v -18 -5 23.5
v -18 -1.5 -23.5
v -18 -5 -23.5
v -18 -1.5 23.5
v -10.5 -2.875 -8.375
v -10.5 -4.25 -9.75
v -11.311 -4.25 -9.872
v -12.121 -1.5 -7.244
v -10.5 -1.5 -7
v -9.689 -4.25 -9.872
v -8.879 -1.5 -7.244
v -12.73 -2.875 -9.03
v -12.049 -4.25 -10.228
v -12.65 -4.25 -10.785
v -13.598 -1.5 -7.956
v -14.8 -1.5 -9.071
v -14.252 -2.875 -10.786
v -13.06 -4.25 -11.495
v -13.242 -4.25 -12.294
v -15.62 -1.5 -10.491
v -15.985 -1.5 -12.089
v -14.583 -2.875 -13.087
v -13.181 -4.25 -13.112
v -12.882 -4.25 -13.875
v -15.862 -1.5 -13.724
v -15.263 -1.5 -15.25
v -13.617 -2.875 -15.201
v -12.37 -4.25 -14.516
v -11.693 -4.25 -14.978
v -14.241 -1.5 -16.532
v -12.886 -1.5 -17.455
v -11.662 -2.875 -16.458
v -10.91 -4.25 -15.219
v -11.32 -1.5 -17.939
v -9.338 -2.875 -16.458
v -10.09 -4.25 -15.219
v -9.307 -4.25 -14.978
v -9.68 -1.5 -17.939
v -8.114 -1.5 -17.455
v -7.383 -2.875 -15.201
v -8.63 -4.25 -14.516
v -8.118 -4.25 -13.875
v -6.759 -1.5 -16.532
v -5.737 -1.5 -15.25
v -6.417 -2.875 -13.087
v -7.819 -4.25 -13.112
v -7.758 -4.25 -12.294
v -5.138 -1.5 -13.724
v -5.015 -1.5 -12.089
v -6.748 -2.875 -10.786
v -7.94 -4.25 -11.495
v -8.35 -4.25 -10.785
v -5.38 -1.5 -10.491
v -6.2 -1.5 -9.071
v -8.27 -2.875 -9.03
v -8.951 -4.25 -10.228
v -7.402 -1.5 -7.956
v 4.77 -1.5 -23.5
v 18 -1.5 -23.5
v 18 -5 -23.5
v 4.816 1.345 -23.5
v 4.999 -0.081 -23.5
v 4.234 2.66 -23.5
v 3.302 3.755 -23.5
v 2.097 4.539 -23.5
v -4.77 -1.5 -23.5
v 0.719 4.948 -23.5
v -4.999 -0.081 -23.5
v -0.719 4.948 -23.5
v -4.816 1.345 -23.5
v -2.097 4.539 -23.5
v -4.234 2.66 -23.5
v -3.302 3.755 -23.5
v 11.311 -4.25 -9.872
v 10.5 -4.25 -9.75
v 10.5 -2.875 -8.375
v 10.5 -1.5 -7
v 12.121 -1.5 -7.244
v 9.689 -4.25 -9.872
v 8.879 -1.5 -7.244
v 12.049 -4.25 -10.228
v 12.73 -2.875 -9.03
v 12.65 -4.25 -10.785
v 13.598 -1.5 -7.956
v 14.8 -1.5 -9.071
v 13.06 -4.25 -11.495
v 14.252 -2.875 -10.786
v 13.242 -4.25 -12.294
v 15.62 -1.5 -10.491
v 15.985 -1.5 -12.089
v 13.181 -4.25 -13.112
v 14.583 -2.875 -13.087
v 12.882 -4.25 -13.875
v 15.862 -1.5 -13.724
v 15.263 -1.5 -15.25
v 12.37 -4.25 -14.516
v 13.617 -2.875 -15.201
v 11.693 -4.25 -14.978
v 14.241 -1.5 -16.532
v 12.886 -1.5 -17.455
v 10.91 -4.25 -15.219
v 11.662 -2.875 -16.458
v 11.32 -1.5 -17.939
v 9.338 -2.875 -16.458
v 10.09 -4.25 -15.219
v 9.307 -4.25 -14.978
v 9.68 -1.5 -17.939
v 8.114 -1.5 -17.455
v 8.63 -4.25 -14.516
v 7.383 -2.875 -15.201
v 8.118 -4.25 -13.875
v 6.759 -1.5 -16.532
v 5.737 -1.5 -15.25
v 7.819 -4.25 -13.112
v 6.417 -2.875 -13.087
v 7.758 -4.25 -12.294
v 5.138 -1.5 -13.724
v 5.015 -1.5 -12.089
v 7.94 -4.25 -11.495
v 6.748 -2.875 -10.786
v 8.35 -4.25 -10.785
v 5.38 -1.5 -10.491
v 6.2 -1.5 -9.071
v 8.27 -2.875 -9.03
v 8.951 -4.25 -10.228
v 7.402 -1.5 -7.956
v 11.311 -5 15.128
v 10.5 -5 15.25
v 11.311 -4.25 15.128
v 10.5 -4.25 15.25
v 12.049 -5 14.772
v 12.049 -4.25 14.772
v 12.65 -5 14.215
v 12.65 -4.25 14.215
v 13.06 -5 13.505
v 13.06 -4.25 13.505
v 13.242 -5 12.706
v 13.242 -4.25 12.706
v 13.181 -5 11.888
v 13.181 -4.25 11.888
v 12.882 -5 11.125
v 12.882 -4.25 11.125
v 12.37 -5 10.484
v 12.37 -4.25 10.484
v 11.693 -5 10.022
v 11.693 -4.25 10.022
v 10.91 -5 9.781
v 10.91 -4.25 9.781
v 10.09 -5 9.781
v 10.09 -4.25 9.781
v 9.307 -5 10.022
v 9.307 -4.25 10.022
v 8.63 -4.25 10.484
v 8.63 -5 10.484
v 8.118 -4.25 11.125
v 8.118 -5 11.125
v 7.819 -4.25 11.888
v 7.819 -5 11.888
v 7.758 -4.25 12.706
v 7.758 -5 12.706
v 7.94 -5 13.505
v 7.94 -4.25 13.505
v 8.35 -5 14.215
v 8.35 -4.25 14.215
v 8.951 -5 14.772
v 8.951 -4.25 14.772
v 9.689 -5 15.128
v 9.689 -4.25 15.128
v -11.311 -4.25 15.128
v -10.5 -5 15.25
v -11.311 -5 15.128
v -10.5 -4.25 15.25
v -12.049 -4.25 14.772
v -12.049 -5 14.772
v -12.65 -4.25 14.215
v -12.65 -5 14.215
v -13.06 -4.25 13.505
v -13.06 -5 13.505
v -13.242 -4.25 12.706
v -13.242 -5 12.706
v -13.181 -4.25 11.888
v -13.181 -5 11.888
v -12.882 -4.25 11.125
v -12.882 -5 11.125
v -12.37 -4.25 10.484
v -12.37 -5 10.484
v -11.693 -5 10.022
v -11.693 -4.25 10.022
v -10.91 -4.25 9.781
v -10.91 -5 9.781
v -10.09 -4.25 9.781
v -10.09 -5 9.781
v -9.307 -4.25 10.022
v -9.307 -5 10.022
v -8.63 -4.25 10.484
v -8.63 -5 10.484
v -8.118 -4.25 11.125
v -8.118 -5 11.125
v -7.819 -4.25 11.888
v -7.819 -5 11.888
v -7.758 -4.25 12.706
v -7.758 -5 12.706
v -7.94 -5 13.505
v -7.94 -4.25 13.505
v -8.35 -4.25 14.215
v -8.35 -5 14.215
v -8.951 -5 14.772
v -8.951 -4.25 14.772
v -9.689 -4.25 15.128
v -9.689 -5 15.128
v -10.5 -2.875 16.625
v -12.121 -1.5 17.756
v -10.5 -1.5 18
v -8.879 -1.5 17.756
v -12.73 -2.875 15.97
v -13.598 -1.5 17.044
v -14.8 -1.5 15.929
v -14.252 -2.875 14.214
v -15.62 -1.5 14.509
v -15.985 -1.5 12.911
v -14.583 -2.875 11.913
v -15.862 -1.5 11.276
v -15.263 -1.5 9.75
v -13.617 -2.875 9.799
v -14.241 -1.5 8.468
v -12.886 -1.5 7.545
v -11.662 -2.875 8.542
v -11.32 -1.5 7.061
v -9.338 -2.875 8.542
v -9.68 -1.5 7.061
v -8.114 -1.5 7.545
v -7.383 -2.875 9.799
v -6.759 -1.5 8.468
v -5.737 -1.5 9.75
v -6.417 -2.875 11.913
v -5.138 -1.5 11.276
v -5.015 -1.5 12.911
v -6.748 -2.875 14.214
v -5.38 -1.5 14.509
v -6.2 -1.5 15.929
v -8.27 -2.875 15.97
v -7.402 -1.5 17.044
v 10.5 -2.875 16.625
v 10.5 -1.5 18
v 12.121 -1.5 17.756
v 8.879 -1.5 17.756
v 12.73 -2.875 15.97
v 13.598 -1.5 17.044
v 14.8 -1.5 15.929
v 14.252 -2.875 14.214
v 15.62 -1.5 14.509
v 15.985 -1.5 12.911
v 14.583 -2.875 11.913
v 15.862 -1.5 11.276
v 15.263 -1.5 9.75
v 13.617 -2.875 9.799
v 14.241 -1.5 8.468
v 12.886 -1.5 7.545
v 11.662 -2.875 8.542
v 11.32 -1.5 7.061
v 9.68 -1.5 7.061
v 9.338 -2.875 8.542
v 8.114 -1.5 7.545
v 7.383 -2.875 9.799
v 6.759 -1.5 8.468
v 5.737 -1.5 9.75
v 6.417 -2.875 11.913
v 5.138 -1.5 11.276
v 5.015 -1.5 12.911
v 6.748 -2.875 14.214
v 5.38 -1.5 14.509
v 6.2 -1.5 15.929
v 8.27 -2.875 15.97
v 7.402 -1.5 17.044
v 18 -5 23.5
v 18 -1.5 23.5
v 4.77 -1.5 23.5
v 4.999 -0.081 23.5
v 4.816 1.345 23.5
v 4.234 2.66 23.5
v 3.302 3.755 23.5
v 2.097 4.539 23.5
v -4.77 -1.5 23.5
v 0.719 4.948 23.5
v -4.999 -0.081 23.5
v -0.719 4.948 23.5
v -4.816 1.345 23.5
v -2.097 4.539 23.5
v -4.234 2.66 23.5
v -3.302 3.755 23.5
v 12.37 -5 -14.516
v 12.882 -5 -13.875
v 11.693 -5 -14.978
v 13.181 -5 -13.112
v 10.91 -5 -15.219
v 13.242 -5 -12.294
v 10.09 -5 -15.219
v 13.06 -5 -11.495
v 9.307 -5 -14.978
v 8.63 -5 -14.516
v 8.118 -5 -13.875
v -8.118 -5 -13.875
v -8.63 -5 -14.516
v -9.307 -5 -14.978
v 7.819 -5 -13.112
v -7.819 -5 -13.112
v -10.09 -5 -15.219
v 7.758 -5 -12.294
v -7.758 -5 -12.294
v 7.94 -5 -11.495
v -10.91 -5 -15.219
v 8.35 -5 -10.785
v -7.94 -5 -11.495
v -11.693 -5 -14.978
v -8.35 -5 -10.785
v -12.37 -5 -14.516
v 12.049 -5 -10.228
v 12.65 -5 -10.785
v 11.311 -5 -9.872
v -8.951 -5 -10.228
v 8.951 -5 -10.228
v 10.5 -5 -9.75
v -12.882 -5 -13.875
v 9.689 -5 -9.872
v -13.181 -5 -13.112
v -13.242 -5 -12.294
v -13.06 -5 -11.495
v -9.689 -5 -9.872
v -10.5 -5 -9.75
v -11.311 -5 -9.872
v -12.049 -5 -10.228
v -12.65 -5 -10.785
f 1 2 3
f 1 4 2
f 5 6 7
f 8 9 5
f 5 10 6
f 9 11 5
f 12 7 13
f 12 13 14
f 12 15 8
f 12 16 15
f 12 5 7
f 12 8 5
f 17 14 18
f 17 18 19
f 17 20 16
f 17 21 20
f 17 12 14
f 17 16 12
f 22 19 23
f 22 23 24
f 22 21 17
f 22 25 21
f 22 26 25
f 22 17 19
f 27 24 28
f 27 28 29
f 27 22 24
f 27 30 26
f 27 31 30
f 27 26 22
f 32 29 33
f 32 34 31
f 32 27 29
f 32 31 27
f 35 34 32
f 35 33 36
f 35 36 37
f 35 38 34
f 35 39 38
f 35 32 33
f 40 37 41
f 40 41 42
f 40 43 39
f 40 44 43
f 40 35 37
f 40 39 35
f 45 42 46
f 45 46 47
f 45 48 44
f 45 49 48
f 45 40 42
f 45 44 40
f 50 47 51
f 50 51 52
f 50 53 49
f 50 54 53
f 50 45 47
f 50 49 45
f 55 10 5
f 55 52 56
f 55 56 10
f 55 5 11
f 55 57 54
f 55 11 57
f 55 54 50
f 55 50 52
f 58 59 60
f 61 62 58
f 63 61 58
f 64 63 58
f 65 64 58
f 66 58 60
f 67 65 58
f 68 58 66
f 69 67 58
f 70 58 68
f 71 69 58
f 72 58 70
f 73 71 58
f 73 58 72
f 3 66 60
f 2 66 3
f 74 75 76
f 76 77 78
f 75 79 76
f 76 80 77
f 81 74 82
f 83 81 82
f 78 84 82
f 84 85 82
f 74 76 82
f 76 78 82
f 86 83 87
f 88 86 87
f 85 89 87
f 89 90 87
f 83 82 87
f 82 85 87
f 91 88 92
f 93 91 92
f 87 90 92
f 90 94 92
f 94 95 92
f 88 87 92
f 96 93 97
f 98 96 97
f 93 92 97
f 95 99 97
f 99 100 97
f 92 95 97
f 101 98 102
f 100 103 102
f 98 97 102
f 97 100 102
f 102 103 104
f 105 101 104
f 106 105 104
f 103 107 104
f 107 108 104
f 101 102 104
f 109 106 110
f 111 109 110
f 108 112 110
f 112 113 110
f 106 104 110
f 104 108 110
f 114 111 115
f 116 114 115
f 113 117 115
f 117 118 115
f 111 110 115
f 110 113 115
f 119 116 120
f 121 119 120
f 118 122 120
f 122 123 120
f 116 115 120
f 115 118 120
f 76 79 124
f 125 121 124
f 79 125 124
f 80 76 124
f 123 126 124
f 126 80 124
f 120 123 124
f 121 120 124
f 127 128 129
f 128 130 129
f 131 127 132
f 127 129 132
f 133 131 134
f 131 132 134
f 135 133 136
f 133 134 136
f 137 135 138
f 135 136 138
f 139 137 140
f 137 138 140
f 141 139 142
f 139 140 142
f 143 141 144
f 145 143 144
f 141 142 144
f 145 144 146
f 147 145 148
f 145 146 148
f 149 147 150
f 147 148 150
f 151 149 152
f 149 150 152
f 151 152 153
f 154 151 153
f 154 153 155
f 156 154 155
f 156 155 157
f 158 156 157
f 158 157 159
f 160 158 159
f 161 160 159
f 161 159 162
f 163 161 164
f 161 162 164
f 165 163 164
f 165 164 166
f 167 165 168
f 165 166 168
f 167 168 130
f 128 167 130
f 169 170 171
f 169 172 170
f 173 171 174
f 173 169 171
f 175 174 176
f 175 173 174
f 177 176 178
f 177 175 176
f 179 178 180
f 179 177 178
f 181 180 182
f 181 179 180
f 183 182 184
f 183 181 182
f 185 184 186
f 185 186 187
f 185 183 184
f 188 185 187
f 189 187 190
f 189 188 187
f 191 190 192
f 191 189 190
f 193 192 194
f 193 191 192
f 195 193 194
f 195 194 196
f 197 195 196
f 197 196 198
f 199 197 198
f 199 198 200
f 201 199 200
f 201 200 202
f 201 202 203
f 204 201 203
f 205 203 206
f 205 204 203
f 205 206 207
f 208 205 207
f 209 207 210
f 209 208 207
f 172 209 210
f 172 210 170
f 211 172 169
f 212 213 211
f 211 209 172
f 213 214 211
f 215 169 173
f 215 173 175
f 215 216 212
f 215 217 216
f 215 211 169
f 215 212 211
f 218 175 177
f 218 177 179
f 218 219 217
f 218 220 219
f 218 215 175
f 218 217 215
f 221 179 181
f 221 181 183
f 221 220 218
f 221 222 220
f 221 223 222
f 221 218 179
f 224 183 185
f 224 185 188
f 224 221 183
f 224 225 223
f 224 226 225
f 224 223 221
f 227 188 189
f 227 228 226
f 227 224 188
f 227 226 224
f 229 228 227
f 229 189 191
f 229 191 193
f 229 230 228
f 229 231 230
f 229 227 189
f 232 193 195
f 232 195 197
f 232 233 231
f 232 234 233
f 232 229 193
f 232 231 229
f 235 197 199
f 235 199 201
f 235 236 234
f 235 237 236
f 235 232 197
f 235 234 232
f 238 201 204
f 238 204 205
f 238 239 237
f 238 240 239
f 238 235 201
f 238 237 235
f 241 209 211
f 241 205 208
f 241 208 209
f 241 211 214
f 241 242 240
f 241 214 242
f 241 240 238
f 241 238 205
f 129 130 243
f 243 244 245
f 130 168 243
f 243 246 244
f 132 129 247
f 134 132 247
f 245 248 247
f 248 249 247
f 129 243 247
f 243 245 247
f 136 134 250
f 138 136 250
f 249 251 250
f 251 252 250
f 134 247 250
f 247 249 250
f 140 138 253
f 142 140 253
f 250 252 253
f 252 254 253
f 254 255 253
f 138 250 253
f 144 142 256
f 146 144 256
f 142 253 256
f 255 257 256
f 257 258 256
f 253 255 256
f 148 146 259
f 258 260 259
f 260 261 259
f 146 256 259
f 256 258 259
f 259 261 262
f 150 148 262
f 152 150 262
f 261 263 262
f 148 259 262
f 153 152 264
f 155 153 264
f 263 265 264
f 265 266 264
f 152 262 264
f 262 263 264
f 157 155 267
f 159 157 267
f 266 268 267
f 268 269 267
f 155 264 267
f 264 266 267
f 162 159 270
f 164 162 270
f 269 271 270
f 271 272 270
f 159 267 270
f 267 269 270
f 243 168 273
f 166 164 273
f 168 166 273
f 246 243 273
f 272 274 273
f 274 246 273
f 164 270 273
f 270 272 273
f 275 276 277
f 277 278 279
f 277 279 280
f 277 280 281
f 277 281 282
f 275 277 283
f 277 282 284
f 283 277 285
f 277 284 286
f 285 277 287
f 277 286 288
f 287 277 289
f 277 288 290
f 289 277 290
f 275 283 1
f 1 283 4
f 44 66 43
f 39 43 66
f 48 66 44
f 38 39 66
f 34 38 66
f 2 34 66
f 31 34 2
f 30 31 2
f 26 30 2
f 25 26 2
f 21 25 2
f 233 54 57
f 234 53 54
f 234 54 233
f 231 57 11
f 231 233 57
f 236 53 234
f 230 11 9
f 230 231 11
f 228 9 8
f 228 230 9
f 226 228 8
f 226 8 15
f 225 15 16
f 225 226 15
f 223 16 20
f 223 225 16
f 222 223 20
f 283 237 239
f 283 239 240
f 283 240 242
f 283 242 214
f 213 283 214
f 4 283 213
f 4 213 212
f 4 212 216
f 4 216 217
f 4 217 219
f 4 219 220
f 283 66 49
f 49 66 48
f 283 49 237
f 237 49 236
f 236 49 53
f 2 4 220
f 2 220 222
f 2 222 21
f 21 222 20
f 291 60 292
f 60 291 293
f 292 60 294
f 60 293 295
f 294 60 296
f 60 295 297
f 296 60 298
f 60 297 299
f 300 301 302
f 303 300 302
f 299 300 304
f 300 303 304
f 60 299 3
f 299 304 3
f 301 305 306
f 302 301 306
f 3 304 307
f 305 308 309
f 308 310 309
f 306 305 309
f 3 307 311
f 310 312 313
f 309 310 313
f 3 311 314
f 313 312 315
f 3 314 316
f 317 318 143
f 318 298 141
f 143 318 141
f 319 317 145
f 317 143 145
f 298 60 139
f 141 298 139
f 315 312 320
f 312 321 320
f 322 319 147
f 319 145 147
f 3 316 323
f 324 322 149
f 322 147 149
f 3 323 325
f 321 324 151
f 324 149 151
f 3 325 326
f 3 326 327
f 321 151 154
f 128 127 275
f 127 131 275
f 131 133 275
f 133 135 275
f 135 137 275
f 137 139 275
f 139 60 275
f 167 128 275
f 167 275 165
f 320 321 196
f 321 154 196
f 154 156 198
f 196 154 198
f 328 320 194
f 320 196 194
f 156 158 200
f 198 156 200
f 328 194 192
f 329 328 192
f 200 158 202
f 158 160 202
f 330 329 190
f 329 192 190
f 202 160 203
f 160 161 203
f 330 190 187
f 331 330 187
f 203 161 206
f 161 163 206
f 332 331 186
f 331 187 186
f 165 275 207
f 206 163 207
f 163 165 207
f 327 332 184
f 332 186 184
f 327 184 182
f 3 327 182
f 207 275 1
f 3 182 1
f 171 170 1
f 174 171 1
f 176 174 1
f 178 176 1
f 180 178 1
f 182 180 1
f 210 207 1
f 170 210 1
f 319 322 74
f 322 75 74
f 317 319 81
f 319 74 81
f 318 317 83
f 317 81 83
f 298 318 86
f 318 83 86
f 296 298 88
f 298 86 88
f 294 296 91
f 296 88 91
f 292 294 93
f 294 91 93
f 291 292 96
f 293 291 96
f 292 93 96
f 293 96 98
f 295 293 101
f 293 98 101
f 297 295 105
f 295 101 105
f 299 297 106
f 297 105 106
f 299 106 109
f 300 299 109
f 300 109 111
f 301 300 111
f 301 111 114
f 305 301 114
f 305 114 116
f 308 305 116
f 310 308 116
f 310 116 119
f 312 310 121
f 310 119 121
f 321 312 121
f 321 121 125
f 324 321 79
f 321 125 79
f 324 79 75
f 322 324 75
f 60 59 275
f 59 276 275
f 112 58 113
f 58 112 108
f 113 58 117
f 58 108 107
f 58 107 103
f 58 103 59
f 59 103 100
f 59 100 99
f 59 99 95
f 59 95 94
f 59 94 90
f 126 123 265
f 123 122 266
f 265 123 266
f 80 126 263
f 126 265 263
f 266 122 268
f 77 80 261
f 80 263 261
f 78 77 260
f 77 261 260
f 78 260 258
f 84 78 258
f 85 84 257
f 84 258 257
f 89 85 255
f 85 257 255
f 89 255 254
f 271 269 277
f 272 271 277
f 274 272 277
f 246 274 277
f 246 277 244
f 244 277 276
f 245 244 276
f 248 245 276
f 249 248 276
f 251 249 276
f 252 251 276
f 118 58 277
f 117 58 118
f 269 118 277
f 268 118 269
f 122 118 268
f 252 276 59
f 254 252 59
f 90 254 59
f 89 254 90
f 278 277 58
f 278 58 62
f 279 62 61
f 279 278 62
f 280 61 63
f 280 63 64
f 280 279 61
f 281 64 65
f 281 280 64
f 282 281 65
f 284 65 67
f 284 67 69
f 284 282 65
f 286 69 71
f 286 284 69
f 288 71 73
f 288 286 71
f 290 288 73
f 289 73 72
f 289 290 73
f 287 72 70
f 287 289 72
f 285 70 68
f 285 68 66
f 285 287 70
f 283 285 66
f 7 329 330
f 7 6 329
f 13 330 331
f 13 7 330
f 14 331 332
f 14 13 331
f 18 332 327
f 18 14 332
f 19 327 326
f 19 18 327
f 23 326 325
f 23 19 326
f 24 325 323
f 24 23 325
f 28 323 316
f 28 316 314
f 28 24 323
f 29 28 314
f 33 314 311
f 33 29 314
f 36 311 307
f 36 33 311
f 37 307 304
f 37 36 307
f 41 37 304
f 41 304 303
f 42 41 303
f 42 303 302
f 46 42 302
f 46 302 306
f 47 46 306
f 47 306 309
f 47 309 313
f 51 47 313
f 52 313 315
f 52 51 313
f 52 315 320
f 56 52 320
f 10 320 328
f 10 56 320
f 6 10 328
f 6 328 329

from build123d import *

# Parameters (mm, degrees)
SKETCH1_R           = 5
BOSS_EXTRUDE1_DEPTH = 23.5
HOLE1_AT_2_COUNT    = 2
HOLE1_AT_2_PITCH    = 25


with BuildPart() as part:
    # Sketch1 → Boss-Extrude1 (new, symmetric)
    with BuildSketch(Plane.XY):
        with BuildLine():
            Line((-18, -5), (0, -5))
            ThreePointArc((0, -5), (-2.958039892, -4.031128874), (-4.769696007, -1.5))
            Line((-4.769696007, -1.5), (-18, -1.5))
            Line((-18, -1.5), (-18, -5))
        make_face()
        Circle(SKETCH1_R)
    boss_extrude1 = extrude(amount=BOSS_EXTRUDE1_DEPTH, both=True)

    # Sketch5 → Hole1 (revolve, cut)
    with BuildSketch(Plane(origin=(-10.5, -1.5, -12.5), x_dir=(0, 0, 1), z_dir=(1, 0, 0))):
        Polygon((0, 0), (0, 5.152366702), (2.75, 3.5), (2.75, 2.75), (5.5, 0), align=None)
    hole1 = revolve(axis=Axis((-10.5, 12.808894879, -12.5), (0, -1, 0)), mode=Mode.SUBTRACT)

    # Hole1 at 2: Hole1 ×2
    with Locations(*[(0, 0, i * HOLE1_AT_2_PITCH) for i in range(1, HOLE1_AT_2_COUNT)]):
        add(hole1, mode=Mode.SUBTRACT)

    # Mirror1: Boss-Extrude1 across plane
    add(boss_extrude1.mirror(Plane(origin=(0, 0, 0), x_dir=(0, 0, 1), z_dir=(1, 0, 0))))

    # Mirror2: Hole1 across plane
    add(hole1.mirror(Plane(origin=(0, 0, 0), x_dir=(0, 0, 1), z_dir=(1, 0, 0))), mode=Mode.SUBTRACT)

    # Mirror2 copy 1 sketch → Mirror2 copy 1 (revolve, cut)
    with BuildSketch(Plane(origin=(10.5, -1.5, 12.5), x_dir=(0, 0, 1), z_dir=(-1, 0, 0))):
        Polygon((0, 0), (0, -5.152366702), (2.75, -3.5), (2.75, -2.75), (5.5, 0), align=None)
    revolve(axis=Axis((10.5, 12.808894879, 12.5), (0, 1, 0)), mode=Mode.SUBTRACT)


solid = part.part
